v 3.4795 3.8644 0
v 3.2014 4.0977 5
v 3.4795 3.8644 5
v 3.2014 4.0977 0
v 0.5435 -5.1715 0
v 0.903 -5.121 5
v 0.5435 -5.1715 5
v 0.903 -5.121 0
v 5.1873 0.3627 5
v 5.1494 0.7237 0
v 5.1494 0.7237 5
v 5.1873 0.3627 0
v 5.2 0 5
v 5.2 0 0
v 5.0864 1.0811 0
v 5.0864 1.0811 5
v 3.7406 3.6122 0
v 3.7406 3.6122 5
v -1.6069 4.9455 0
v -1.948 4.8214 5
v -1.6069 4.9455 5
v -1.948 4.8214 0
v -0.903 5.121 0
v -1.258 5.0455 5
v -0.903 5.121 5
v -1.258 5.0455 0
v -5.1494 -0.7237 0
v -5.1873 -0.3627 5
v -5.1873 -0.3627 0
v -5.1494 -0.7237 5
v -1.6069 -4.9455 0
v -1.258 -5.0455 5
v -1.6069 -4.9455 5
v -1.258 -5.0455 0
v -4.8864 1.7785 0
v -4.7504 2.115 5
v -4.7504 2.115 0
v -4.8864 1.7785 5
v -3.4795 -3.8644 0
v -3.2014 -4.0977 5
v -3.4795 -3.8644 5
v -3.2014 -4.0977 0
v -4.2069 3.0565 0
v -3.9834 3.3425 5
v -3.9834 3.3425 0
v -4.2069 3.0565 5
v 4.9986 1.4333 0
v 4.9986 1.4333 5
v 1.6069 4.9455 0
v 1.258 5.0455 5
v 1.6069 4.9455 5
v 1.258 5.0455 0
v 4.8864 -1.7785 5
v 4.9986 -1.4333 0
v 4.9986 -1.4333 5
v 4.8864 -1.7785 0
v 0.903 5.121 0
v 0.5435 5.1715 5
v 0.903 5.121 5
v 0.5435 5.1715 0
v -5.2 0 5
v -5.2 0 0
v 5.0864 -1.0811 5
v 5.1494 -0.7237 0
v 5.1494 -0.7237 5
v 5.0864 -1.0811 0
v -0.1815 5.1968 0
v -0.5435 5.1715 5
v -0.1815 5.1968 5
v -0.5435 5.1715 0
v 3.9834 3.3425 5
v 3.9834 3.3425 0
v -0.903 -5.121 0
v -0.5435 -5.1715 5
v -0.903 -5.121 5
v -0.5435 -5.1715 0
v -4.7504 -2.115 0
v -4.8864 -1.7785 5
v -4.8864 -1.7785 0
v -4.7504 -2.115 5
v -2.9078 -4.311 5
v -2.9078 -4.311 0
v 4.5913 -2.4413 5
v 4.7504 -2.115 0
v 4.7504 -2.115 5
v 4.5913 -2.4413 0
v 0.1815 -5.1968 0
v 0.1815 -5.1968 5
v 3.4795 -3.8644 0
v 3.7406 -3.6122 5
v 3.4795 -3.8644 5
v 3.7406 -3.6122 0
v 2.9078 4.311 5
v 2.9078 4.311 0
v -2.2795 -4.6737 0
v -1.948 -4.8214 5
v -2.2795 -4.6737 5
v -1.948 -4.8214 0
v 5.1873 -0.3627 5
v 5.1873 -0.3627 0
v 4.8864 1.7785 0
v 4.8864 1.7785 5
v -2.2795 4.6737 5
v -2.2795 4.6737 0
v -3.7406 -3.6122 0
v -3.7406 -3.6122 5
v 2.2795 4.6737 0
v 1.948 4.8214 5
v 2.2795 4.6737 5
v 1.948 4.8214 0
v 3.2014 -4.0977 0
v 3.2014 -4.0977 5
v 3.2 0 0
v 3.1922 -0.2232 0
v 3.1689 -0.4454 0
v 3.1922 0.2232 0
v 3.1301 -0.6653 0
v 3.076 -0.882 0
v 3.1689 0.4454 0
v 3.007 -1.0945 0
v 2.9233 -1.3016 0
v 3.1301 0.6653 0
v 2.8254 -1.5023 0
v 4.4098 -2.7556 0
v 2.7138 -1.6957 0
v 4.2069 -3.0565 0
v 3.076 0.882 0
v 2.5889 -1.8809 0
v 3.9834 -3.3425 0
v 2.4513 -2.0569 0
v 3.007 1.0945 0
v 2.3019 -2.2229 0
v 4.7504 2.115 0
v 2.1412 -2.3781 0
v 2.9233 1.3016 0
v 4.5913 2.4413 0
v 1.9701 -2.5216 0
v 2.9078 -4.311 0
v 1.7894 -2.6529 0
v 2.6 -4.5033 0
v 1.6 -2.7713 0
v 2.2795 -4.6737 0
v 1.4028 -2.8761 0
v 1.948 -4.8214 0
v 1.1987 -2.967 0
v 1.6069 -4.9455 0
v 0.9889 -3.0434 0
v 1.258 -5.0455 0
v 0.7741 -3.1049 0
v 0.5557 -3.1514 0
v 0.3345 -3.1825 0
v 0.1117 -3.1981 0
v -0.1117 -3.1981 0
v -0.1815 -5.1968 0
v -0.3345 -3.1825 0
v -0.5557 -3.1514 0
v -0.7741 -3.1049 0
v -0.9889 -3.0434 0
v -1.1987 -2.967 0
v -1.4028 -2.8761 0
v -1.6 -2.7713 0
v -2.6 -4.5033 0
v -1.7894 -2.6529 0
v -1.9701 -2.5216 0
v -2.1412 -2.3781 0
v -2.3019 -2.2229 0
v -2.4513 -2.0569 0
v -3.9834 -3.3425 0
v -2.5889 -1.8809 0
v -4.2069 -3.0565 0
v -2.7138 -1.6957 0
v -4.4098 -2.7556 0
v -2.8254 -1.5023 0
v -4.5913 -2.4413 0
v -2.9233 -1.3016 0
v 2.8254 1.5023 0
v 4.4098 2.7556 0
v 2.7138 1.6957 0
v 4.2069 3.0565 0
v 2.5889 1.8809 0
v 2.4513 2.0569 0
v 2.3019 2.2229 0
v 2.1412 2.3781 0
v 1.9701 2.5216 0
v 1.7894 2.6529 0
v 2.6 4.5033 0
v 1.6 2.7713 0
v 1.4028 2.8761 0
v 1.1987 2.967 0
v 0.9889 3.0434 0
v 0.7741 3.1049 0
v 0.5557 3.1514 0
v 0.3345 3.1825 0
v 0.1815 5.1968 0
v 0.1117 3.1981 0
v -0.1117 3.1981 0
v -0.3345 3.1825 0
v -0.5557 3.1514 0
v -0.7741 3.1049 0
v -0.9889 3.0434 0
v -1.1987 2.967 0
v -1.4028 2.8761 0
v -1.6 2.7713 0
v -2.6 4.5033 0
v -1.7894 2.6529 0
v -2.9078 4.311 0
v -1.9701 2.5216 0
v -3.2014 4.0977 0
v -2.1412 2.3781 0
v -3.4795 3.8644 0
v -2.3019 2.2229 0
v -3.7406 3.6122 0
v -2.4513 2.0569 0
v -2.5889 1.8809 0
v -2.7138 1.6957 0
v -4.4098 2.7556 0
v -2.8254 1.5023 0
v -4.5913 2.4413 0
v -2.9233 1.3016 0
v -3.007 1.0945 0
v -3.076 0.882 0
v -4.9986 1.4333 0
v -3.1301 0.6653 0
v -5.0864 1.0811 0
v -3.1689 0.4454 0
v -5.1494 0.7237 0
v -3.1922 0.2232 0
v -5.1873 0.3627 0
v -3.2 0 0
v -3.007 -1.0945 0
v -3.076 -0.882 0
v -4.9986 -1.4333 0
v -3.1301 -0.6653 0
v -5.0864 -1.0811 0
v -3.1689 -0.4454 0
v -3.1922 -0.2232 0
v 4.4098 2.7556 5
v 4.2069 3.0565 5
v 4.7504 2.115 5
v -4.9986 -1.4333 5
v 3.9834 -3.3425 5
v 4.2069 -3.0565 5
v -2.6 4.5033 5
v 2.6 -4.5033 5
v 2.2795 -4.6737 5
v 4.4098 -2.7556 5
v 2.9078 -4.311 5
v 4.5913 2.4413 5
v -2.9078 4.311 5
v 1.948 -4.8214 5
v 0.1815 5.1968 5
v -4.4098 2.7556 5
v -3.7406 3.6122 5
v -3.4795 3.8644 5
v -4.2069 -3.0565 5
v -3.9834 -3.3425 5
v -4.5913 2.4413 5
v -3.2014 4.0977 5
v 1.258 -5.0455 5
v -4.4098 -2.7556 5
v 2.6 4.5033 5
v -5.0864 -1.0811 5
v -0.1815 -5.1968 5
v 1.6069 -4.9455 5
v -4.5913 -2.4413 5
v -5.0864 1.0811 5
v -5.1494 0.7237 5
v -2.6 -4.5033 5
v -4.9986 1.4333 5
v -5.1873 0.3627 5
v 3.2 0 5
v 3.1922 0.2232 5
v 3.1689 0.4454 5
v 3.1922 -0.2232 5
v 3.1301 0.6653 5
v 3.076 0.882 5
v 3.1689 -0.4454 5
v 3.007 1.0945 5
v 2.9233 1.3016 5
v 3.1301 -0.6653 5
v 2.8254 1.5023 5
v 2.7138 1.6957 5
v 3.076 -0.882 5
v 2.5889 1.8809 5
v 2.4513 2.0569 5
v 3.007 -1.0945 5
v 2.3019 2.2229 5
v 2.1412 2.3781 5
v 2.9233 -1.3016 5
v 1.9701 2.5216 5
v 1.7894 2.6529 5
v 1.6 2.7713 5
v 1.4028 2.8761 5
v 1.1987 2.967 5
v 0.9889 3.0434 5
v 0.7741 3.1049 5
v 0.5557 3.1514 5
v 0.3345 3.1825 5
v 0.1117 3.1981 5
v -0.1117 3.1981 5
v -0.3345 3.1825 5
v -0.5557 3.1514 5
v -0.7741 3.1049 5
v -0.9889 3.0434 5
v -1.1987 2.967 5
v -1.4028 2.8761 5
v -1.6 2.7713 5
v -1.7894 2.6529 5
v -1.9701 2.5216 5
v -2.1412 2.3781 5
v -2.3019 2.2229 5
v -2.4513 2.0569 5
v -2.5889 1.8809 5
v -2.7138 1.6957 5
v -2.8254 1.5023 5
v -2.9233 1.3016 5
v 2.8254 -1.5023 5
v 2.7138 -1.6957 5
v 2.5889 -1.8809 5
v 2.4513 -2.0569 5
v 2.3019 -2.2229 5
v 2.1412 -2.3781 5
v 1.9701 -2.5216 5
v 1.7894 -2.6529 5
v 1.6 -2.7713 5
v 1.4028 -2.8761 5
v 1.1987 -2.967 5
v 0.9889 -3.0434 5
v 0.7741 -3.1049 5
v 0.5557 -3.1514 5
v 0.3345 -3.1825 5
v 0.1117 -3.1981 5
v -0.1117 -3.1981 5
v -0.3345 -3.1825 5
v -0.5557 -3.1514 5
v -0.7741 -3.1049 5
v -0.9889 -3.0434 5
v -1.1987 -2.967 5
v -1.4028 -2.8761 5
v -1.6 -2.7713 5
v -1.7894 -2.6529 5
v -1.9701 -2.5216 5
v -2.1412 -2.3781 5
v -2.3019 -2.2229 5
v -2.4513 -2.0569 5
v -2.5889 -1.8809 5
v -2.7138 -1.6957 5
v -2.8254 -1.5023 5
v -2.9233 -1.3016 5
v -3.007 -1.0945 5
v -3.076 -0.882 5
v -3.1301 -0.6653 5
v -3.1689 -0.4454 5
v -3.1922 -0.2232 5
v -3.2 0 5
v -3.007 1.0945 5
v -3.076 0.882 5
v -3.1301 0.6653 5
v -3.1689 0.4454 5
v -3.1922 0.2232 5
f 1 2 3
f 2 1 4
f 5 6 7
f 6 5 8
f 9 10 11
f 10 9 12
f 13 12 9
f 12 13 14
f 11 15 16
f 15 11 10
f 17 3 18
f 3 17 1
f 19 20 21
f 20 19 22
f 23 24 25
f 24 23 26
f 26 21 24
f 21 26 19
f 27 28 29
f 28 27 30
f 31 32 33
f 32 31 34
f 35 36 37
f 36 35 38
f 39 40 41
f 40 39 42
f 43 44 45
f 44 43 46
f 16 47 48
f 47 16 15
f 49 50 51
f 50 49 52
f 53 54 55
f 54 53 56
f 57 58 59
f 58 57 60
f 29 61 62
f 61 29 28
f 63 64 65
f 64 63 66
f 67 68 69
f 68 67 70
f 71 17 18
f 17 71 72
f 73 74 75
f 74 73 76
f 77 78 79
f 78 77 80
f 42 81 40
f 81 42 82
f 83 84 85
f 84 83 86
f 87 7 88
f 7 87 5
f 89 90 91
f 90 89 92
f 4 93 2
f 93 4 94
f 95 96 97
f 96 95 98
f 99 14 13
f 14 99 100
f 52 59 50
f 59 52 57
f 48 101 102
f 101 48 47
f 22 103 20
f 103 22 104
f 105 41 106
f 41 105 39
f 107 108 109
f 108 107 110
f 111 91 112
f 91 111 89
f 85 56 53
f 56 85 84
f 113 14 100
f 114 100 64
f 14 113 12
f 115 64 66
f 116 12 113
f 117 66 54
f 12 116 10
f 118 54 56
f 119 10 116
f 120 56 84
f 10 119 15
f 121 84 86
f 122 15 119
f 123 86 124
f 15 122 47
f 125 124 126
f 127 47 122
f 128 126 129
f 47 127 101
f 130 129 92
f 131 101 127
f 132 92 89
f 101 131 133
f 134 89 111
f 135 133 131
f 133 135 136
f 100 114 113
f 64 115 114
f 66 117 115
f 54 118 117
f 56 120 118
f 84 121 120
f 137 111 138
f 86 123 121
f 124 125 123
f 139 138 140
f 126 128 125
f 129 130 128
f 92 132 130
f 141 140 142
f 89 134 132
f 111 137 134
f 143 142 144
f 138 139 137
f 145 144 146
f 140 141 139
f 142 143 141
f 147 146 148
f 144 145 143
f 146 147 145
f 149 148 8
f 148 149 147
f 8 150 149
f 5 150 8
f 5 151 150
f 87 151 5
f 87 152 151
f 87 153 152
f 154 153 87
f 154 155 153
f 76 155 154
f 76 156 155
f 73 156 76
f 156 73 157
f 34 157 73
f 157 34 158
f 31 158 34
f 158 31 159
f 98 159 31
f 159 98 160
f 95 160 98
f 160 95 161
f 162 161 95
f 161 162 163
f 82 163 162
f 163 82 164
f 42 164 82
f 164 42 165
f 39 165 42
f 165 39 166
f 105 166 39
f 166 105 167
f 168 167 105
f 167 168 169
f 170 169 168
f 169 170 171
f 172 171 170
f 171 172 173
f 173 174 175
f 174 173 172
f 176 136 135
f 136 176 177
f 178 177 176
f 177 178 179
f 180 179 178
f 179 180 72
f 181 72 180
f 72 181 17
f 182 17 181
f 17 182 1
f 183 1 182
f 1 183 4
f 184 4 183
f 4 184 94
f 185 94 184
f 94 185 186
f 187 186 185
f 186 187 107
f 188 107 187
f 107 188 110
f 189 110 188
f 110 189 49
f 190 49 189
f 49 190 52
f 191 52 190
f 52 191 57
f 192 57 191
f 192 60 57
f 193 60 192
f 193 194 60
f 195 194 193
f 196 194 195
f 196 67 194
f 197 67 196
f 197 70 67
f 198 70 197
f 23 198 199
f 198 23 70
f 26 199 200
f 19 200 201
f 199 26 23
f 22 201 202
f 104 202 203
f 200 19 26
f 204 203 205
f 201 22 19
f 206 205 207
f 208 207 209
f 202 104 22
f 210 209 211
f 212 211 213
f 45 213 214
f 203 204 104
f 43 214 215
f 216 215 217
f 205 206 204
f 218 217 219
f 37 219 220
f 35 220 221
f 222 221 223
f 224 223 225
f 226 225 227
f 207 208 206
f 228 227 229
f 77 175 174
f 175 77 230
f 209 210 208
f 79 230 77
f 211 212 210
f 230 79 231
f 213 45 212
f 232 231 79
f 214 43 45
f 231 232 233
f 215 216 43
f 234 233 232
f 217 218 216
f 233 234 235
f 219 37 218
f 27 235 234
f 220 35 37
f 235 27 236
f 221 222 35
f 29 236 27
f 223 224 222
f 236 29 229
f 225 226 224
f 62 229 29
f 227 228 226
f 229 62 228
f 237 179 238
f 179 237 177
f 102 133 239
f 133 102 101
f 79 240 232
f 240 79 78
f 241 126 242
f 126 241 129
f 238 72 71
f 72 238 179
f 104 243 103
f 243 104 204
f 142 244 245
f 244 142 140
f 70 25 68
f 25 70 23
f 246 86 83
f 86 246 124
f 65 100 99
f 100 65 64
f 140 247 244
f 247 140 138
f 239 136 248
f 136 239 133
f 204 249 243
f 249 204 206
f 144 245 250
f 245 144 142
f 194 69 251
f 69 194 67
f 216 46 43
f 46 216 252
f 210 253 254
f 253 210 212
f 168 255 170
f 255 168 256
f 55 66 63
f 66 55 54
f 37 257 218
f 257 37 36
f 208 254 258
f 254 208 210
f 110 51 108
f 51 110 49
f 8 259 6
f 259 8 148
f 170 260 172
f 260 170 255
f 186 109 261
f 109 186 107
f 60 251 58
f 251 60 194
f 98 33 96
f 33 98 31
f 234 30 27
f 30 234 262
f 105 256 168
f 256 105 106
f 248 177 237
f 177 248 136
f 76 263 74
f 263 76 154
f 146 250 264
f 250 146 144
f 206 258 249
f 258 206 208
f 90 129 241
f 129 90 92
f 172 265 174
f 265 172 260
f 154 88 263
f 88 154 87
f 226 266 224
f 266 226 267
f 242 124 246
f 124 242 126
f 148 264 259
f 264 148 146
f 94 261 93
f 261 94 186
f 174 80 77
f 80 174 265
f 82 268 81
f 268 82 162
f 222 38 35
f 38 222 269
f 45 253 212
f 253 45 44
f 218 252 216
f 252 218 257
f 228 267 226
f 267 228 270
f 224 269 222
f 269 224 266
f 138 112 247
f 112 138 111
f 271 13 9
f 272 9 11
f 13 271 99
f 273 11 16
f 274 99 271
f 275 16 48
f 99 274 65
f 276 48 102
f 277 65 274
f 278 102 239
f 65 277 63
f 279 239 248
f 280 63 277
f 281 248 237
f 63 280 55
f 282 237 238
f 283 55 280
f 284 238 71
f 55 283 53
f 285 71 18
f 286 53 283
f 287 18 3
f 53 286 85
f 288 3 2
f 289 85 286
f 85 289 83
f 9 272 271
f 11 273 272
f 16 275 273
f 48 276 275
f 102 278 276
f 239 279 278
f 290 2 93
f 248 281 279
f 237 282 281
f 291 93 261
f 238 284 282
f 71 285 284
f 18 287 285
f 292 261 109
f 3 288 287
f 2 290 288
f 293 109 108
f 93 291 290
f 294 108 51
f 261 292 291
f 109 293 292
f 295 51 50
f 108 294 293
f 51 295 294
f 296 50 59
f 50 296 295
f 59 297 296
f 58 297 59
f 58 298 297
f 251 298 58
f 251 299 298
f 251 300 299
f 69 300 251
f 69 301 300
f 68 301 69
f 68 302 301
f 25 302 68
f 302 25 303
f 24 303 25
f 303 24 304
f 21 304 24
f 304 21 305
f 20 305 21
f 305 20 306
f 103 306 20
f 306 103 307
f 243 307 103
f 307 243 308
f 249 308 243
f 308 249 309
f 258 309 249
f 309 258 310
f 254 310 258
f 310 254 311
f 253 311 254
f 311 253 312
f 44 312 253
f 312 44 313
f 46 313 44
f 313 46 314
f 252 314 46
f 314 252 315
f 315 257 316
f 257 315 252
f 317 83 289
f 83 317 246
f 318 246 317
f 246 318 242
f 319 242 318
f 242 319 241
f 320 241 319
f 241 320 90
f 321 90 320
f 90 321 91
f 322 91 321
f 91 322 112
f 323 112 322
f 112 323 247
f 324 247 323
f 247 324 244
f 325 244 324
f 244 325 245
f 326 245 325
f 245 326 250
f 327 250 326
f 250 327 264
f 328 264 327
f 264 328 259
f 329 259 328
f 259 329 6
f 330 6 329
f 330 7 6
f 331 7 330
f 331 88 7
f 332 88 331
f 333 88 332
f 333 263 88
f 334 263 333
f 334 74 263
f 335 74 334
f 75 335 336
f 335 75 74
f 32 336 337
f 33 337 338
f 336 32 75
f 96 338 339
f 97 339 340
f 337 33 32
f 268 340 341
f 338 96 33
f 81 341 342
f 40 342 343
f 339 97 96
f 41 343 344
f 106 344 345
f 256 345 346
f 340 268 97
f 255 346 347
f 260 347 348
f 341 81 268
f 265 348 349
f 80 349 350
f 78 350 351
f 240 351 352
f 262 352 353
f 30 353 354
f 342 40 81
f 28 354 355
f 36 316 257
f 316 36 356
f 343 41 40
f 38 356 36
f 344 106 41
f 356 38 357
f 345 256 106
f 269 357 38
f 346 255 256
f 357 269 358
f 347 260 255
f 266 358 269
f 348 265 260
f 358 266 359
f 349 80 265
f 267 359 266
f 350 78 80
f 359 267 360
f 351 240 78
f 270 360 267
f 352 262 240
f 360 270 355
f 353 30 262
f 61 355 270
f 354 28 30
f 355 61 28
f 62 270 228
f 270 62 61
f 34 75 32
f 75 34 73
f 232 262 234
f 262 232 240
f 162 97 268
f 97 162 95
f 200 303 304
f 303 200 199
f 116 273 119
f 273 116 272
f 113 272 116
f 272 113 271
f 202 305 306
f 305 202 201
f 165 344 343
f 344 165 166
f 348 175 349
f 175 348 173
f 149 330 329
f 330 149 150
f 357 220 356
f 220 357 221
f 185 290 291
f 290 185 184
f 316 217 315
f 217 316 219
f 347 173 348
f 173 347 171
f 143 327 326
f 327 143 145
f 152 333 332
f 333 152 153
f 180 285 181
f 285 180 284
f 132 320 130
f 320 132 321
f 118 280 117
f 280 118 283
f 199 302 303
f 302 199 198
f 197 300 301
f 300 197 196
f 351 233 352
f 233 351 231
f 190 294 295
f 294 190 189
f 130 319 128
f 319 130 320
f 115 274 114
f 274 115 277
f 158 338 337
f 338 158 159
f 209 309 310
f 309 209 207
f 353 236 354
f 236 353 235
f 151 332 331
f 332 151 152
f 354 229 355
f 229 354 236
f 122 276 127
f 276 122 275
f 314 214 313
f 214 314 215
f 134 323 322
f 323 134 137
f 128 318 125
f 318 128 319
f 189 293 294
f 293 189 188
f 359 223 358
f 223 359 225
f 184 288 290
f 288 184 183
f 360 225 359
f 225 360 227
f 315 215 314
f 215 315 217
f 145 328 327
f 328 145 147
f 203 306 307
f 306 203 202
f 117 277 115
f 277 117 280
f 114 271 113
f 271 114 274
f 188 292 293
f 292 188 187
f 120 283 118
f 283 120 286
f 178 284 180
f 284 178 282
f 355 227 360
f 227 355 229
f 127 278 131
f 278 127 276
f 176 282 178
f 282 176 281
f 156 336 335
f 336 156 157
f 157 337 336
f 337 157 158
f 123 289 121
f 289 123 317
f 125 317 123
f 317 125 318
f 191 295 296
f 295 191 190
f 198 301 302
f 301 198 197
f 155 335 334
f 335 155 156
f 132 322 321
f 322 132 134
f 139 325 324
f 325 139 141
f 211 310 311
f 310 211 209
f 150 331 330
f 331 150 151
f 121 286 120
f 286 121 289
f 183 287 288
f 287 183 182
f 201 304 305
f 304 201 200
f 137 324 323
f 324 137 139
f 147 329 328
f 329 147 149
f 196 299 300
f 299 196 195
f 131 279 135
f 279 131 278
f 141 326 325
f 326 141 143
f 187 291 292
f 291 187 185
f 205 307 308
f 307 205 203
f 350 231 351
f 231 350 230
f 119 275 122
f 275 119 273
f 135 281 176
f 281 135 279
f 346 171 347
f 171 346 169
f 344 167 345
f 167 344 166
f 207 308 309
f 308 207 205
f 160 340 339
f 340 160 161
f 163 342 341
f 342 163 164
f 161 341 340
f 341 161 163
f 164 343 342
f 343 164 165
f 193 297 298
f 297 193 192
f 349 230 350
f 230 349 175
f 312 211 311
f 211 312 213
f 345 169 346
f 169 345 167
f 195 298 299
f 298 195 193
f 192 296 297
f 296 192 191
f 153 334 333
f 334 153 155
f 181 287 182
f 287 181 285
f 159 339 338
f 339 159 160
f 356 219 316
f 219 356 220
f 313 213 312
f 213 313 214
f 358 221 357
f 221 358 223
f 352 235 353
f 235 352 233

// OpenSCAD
$inner = 3.2;
$outer = $inner+2;
$height = 5;
$fn = 90;

module spacer($inner = 3.2, $thickness = 2, $height = 5) 
{
  difference()
  {
    cylinder(r=$inner+$thickness, h=$height);
    translate([0,0,-$height/2]) cylinder(r=$inner, h=$height*2);
  }
}

union()
{
    spacer();
    translate(2,0,0)
    {
        spacer();
    }
}
